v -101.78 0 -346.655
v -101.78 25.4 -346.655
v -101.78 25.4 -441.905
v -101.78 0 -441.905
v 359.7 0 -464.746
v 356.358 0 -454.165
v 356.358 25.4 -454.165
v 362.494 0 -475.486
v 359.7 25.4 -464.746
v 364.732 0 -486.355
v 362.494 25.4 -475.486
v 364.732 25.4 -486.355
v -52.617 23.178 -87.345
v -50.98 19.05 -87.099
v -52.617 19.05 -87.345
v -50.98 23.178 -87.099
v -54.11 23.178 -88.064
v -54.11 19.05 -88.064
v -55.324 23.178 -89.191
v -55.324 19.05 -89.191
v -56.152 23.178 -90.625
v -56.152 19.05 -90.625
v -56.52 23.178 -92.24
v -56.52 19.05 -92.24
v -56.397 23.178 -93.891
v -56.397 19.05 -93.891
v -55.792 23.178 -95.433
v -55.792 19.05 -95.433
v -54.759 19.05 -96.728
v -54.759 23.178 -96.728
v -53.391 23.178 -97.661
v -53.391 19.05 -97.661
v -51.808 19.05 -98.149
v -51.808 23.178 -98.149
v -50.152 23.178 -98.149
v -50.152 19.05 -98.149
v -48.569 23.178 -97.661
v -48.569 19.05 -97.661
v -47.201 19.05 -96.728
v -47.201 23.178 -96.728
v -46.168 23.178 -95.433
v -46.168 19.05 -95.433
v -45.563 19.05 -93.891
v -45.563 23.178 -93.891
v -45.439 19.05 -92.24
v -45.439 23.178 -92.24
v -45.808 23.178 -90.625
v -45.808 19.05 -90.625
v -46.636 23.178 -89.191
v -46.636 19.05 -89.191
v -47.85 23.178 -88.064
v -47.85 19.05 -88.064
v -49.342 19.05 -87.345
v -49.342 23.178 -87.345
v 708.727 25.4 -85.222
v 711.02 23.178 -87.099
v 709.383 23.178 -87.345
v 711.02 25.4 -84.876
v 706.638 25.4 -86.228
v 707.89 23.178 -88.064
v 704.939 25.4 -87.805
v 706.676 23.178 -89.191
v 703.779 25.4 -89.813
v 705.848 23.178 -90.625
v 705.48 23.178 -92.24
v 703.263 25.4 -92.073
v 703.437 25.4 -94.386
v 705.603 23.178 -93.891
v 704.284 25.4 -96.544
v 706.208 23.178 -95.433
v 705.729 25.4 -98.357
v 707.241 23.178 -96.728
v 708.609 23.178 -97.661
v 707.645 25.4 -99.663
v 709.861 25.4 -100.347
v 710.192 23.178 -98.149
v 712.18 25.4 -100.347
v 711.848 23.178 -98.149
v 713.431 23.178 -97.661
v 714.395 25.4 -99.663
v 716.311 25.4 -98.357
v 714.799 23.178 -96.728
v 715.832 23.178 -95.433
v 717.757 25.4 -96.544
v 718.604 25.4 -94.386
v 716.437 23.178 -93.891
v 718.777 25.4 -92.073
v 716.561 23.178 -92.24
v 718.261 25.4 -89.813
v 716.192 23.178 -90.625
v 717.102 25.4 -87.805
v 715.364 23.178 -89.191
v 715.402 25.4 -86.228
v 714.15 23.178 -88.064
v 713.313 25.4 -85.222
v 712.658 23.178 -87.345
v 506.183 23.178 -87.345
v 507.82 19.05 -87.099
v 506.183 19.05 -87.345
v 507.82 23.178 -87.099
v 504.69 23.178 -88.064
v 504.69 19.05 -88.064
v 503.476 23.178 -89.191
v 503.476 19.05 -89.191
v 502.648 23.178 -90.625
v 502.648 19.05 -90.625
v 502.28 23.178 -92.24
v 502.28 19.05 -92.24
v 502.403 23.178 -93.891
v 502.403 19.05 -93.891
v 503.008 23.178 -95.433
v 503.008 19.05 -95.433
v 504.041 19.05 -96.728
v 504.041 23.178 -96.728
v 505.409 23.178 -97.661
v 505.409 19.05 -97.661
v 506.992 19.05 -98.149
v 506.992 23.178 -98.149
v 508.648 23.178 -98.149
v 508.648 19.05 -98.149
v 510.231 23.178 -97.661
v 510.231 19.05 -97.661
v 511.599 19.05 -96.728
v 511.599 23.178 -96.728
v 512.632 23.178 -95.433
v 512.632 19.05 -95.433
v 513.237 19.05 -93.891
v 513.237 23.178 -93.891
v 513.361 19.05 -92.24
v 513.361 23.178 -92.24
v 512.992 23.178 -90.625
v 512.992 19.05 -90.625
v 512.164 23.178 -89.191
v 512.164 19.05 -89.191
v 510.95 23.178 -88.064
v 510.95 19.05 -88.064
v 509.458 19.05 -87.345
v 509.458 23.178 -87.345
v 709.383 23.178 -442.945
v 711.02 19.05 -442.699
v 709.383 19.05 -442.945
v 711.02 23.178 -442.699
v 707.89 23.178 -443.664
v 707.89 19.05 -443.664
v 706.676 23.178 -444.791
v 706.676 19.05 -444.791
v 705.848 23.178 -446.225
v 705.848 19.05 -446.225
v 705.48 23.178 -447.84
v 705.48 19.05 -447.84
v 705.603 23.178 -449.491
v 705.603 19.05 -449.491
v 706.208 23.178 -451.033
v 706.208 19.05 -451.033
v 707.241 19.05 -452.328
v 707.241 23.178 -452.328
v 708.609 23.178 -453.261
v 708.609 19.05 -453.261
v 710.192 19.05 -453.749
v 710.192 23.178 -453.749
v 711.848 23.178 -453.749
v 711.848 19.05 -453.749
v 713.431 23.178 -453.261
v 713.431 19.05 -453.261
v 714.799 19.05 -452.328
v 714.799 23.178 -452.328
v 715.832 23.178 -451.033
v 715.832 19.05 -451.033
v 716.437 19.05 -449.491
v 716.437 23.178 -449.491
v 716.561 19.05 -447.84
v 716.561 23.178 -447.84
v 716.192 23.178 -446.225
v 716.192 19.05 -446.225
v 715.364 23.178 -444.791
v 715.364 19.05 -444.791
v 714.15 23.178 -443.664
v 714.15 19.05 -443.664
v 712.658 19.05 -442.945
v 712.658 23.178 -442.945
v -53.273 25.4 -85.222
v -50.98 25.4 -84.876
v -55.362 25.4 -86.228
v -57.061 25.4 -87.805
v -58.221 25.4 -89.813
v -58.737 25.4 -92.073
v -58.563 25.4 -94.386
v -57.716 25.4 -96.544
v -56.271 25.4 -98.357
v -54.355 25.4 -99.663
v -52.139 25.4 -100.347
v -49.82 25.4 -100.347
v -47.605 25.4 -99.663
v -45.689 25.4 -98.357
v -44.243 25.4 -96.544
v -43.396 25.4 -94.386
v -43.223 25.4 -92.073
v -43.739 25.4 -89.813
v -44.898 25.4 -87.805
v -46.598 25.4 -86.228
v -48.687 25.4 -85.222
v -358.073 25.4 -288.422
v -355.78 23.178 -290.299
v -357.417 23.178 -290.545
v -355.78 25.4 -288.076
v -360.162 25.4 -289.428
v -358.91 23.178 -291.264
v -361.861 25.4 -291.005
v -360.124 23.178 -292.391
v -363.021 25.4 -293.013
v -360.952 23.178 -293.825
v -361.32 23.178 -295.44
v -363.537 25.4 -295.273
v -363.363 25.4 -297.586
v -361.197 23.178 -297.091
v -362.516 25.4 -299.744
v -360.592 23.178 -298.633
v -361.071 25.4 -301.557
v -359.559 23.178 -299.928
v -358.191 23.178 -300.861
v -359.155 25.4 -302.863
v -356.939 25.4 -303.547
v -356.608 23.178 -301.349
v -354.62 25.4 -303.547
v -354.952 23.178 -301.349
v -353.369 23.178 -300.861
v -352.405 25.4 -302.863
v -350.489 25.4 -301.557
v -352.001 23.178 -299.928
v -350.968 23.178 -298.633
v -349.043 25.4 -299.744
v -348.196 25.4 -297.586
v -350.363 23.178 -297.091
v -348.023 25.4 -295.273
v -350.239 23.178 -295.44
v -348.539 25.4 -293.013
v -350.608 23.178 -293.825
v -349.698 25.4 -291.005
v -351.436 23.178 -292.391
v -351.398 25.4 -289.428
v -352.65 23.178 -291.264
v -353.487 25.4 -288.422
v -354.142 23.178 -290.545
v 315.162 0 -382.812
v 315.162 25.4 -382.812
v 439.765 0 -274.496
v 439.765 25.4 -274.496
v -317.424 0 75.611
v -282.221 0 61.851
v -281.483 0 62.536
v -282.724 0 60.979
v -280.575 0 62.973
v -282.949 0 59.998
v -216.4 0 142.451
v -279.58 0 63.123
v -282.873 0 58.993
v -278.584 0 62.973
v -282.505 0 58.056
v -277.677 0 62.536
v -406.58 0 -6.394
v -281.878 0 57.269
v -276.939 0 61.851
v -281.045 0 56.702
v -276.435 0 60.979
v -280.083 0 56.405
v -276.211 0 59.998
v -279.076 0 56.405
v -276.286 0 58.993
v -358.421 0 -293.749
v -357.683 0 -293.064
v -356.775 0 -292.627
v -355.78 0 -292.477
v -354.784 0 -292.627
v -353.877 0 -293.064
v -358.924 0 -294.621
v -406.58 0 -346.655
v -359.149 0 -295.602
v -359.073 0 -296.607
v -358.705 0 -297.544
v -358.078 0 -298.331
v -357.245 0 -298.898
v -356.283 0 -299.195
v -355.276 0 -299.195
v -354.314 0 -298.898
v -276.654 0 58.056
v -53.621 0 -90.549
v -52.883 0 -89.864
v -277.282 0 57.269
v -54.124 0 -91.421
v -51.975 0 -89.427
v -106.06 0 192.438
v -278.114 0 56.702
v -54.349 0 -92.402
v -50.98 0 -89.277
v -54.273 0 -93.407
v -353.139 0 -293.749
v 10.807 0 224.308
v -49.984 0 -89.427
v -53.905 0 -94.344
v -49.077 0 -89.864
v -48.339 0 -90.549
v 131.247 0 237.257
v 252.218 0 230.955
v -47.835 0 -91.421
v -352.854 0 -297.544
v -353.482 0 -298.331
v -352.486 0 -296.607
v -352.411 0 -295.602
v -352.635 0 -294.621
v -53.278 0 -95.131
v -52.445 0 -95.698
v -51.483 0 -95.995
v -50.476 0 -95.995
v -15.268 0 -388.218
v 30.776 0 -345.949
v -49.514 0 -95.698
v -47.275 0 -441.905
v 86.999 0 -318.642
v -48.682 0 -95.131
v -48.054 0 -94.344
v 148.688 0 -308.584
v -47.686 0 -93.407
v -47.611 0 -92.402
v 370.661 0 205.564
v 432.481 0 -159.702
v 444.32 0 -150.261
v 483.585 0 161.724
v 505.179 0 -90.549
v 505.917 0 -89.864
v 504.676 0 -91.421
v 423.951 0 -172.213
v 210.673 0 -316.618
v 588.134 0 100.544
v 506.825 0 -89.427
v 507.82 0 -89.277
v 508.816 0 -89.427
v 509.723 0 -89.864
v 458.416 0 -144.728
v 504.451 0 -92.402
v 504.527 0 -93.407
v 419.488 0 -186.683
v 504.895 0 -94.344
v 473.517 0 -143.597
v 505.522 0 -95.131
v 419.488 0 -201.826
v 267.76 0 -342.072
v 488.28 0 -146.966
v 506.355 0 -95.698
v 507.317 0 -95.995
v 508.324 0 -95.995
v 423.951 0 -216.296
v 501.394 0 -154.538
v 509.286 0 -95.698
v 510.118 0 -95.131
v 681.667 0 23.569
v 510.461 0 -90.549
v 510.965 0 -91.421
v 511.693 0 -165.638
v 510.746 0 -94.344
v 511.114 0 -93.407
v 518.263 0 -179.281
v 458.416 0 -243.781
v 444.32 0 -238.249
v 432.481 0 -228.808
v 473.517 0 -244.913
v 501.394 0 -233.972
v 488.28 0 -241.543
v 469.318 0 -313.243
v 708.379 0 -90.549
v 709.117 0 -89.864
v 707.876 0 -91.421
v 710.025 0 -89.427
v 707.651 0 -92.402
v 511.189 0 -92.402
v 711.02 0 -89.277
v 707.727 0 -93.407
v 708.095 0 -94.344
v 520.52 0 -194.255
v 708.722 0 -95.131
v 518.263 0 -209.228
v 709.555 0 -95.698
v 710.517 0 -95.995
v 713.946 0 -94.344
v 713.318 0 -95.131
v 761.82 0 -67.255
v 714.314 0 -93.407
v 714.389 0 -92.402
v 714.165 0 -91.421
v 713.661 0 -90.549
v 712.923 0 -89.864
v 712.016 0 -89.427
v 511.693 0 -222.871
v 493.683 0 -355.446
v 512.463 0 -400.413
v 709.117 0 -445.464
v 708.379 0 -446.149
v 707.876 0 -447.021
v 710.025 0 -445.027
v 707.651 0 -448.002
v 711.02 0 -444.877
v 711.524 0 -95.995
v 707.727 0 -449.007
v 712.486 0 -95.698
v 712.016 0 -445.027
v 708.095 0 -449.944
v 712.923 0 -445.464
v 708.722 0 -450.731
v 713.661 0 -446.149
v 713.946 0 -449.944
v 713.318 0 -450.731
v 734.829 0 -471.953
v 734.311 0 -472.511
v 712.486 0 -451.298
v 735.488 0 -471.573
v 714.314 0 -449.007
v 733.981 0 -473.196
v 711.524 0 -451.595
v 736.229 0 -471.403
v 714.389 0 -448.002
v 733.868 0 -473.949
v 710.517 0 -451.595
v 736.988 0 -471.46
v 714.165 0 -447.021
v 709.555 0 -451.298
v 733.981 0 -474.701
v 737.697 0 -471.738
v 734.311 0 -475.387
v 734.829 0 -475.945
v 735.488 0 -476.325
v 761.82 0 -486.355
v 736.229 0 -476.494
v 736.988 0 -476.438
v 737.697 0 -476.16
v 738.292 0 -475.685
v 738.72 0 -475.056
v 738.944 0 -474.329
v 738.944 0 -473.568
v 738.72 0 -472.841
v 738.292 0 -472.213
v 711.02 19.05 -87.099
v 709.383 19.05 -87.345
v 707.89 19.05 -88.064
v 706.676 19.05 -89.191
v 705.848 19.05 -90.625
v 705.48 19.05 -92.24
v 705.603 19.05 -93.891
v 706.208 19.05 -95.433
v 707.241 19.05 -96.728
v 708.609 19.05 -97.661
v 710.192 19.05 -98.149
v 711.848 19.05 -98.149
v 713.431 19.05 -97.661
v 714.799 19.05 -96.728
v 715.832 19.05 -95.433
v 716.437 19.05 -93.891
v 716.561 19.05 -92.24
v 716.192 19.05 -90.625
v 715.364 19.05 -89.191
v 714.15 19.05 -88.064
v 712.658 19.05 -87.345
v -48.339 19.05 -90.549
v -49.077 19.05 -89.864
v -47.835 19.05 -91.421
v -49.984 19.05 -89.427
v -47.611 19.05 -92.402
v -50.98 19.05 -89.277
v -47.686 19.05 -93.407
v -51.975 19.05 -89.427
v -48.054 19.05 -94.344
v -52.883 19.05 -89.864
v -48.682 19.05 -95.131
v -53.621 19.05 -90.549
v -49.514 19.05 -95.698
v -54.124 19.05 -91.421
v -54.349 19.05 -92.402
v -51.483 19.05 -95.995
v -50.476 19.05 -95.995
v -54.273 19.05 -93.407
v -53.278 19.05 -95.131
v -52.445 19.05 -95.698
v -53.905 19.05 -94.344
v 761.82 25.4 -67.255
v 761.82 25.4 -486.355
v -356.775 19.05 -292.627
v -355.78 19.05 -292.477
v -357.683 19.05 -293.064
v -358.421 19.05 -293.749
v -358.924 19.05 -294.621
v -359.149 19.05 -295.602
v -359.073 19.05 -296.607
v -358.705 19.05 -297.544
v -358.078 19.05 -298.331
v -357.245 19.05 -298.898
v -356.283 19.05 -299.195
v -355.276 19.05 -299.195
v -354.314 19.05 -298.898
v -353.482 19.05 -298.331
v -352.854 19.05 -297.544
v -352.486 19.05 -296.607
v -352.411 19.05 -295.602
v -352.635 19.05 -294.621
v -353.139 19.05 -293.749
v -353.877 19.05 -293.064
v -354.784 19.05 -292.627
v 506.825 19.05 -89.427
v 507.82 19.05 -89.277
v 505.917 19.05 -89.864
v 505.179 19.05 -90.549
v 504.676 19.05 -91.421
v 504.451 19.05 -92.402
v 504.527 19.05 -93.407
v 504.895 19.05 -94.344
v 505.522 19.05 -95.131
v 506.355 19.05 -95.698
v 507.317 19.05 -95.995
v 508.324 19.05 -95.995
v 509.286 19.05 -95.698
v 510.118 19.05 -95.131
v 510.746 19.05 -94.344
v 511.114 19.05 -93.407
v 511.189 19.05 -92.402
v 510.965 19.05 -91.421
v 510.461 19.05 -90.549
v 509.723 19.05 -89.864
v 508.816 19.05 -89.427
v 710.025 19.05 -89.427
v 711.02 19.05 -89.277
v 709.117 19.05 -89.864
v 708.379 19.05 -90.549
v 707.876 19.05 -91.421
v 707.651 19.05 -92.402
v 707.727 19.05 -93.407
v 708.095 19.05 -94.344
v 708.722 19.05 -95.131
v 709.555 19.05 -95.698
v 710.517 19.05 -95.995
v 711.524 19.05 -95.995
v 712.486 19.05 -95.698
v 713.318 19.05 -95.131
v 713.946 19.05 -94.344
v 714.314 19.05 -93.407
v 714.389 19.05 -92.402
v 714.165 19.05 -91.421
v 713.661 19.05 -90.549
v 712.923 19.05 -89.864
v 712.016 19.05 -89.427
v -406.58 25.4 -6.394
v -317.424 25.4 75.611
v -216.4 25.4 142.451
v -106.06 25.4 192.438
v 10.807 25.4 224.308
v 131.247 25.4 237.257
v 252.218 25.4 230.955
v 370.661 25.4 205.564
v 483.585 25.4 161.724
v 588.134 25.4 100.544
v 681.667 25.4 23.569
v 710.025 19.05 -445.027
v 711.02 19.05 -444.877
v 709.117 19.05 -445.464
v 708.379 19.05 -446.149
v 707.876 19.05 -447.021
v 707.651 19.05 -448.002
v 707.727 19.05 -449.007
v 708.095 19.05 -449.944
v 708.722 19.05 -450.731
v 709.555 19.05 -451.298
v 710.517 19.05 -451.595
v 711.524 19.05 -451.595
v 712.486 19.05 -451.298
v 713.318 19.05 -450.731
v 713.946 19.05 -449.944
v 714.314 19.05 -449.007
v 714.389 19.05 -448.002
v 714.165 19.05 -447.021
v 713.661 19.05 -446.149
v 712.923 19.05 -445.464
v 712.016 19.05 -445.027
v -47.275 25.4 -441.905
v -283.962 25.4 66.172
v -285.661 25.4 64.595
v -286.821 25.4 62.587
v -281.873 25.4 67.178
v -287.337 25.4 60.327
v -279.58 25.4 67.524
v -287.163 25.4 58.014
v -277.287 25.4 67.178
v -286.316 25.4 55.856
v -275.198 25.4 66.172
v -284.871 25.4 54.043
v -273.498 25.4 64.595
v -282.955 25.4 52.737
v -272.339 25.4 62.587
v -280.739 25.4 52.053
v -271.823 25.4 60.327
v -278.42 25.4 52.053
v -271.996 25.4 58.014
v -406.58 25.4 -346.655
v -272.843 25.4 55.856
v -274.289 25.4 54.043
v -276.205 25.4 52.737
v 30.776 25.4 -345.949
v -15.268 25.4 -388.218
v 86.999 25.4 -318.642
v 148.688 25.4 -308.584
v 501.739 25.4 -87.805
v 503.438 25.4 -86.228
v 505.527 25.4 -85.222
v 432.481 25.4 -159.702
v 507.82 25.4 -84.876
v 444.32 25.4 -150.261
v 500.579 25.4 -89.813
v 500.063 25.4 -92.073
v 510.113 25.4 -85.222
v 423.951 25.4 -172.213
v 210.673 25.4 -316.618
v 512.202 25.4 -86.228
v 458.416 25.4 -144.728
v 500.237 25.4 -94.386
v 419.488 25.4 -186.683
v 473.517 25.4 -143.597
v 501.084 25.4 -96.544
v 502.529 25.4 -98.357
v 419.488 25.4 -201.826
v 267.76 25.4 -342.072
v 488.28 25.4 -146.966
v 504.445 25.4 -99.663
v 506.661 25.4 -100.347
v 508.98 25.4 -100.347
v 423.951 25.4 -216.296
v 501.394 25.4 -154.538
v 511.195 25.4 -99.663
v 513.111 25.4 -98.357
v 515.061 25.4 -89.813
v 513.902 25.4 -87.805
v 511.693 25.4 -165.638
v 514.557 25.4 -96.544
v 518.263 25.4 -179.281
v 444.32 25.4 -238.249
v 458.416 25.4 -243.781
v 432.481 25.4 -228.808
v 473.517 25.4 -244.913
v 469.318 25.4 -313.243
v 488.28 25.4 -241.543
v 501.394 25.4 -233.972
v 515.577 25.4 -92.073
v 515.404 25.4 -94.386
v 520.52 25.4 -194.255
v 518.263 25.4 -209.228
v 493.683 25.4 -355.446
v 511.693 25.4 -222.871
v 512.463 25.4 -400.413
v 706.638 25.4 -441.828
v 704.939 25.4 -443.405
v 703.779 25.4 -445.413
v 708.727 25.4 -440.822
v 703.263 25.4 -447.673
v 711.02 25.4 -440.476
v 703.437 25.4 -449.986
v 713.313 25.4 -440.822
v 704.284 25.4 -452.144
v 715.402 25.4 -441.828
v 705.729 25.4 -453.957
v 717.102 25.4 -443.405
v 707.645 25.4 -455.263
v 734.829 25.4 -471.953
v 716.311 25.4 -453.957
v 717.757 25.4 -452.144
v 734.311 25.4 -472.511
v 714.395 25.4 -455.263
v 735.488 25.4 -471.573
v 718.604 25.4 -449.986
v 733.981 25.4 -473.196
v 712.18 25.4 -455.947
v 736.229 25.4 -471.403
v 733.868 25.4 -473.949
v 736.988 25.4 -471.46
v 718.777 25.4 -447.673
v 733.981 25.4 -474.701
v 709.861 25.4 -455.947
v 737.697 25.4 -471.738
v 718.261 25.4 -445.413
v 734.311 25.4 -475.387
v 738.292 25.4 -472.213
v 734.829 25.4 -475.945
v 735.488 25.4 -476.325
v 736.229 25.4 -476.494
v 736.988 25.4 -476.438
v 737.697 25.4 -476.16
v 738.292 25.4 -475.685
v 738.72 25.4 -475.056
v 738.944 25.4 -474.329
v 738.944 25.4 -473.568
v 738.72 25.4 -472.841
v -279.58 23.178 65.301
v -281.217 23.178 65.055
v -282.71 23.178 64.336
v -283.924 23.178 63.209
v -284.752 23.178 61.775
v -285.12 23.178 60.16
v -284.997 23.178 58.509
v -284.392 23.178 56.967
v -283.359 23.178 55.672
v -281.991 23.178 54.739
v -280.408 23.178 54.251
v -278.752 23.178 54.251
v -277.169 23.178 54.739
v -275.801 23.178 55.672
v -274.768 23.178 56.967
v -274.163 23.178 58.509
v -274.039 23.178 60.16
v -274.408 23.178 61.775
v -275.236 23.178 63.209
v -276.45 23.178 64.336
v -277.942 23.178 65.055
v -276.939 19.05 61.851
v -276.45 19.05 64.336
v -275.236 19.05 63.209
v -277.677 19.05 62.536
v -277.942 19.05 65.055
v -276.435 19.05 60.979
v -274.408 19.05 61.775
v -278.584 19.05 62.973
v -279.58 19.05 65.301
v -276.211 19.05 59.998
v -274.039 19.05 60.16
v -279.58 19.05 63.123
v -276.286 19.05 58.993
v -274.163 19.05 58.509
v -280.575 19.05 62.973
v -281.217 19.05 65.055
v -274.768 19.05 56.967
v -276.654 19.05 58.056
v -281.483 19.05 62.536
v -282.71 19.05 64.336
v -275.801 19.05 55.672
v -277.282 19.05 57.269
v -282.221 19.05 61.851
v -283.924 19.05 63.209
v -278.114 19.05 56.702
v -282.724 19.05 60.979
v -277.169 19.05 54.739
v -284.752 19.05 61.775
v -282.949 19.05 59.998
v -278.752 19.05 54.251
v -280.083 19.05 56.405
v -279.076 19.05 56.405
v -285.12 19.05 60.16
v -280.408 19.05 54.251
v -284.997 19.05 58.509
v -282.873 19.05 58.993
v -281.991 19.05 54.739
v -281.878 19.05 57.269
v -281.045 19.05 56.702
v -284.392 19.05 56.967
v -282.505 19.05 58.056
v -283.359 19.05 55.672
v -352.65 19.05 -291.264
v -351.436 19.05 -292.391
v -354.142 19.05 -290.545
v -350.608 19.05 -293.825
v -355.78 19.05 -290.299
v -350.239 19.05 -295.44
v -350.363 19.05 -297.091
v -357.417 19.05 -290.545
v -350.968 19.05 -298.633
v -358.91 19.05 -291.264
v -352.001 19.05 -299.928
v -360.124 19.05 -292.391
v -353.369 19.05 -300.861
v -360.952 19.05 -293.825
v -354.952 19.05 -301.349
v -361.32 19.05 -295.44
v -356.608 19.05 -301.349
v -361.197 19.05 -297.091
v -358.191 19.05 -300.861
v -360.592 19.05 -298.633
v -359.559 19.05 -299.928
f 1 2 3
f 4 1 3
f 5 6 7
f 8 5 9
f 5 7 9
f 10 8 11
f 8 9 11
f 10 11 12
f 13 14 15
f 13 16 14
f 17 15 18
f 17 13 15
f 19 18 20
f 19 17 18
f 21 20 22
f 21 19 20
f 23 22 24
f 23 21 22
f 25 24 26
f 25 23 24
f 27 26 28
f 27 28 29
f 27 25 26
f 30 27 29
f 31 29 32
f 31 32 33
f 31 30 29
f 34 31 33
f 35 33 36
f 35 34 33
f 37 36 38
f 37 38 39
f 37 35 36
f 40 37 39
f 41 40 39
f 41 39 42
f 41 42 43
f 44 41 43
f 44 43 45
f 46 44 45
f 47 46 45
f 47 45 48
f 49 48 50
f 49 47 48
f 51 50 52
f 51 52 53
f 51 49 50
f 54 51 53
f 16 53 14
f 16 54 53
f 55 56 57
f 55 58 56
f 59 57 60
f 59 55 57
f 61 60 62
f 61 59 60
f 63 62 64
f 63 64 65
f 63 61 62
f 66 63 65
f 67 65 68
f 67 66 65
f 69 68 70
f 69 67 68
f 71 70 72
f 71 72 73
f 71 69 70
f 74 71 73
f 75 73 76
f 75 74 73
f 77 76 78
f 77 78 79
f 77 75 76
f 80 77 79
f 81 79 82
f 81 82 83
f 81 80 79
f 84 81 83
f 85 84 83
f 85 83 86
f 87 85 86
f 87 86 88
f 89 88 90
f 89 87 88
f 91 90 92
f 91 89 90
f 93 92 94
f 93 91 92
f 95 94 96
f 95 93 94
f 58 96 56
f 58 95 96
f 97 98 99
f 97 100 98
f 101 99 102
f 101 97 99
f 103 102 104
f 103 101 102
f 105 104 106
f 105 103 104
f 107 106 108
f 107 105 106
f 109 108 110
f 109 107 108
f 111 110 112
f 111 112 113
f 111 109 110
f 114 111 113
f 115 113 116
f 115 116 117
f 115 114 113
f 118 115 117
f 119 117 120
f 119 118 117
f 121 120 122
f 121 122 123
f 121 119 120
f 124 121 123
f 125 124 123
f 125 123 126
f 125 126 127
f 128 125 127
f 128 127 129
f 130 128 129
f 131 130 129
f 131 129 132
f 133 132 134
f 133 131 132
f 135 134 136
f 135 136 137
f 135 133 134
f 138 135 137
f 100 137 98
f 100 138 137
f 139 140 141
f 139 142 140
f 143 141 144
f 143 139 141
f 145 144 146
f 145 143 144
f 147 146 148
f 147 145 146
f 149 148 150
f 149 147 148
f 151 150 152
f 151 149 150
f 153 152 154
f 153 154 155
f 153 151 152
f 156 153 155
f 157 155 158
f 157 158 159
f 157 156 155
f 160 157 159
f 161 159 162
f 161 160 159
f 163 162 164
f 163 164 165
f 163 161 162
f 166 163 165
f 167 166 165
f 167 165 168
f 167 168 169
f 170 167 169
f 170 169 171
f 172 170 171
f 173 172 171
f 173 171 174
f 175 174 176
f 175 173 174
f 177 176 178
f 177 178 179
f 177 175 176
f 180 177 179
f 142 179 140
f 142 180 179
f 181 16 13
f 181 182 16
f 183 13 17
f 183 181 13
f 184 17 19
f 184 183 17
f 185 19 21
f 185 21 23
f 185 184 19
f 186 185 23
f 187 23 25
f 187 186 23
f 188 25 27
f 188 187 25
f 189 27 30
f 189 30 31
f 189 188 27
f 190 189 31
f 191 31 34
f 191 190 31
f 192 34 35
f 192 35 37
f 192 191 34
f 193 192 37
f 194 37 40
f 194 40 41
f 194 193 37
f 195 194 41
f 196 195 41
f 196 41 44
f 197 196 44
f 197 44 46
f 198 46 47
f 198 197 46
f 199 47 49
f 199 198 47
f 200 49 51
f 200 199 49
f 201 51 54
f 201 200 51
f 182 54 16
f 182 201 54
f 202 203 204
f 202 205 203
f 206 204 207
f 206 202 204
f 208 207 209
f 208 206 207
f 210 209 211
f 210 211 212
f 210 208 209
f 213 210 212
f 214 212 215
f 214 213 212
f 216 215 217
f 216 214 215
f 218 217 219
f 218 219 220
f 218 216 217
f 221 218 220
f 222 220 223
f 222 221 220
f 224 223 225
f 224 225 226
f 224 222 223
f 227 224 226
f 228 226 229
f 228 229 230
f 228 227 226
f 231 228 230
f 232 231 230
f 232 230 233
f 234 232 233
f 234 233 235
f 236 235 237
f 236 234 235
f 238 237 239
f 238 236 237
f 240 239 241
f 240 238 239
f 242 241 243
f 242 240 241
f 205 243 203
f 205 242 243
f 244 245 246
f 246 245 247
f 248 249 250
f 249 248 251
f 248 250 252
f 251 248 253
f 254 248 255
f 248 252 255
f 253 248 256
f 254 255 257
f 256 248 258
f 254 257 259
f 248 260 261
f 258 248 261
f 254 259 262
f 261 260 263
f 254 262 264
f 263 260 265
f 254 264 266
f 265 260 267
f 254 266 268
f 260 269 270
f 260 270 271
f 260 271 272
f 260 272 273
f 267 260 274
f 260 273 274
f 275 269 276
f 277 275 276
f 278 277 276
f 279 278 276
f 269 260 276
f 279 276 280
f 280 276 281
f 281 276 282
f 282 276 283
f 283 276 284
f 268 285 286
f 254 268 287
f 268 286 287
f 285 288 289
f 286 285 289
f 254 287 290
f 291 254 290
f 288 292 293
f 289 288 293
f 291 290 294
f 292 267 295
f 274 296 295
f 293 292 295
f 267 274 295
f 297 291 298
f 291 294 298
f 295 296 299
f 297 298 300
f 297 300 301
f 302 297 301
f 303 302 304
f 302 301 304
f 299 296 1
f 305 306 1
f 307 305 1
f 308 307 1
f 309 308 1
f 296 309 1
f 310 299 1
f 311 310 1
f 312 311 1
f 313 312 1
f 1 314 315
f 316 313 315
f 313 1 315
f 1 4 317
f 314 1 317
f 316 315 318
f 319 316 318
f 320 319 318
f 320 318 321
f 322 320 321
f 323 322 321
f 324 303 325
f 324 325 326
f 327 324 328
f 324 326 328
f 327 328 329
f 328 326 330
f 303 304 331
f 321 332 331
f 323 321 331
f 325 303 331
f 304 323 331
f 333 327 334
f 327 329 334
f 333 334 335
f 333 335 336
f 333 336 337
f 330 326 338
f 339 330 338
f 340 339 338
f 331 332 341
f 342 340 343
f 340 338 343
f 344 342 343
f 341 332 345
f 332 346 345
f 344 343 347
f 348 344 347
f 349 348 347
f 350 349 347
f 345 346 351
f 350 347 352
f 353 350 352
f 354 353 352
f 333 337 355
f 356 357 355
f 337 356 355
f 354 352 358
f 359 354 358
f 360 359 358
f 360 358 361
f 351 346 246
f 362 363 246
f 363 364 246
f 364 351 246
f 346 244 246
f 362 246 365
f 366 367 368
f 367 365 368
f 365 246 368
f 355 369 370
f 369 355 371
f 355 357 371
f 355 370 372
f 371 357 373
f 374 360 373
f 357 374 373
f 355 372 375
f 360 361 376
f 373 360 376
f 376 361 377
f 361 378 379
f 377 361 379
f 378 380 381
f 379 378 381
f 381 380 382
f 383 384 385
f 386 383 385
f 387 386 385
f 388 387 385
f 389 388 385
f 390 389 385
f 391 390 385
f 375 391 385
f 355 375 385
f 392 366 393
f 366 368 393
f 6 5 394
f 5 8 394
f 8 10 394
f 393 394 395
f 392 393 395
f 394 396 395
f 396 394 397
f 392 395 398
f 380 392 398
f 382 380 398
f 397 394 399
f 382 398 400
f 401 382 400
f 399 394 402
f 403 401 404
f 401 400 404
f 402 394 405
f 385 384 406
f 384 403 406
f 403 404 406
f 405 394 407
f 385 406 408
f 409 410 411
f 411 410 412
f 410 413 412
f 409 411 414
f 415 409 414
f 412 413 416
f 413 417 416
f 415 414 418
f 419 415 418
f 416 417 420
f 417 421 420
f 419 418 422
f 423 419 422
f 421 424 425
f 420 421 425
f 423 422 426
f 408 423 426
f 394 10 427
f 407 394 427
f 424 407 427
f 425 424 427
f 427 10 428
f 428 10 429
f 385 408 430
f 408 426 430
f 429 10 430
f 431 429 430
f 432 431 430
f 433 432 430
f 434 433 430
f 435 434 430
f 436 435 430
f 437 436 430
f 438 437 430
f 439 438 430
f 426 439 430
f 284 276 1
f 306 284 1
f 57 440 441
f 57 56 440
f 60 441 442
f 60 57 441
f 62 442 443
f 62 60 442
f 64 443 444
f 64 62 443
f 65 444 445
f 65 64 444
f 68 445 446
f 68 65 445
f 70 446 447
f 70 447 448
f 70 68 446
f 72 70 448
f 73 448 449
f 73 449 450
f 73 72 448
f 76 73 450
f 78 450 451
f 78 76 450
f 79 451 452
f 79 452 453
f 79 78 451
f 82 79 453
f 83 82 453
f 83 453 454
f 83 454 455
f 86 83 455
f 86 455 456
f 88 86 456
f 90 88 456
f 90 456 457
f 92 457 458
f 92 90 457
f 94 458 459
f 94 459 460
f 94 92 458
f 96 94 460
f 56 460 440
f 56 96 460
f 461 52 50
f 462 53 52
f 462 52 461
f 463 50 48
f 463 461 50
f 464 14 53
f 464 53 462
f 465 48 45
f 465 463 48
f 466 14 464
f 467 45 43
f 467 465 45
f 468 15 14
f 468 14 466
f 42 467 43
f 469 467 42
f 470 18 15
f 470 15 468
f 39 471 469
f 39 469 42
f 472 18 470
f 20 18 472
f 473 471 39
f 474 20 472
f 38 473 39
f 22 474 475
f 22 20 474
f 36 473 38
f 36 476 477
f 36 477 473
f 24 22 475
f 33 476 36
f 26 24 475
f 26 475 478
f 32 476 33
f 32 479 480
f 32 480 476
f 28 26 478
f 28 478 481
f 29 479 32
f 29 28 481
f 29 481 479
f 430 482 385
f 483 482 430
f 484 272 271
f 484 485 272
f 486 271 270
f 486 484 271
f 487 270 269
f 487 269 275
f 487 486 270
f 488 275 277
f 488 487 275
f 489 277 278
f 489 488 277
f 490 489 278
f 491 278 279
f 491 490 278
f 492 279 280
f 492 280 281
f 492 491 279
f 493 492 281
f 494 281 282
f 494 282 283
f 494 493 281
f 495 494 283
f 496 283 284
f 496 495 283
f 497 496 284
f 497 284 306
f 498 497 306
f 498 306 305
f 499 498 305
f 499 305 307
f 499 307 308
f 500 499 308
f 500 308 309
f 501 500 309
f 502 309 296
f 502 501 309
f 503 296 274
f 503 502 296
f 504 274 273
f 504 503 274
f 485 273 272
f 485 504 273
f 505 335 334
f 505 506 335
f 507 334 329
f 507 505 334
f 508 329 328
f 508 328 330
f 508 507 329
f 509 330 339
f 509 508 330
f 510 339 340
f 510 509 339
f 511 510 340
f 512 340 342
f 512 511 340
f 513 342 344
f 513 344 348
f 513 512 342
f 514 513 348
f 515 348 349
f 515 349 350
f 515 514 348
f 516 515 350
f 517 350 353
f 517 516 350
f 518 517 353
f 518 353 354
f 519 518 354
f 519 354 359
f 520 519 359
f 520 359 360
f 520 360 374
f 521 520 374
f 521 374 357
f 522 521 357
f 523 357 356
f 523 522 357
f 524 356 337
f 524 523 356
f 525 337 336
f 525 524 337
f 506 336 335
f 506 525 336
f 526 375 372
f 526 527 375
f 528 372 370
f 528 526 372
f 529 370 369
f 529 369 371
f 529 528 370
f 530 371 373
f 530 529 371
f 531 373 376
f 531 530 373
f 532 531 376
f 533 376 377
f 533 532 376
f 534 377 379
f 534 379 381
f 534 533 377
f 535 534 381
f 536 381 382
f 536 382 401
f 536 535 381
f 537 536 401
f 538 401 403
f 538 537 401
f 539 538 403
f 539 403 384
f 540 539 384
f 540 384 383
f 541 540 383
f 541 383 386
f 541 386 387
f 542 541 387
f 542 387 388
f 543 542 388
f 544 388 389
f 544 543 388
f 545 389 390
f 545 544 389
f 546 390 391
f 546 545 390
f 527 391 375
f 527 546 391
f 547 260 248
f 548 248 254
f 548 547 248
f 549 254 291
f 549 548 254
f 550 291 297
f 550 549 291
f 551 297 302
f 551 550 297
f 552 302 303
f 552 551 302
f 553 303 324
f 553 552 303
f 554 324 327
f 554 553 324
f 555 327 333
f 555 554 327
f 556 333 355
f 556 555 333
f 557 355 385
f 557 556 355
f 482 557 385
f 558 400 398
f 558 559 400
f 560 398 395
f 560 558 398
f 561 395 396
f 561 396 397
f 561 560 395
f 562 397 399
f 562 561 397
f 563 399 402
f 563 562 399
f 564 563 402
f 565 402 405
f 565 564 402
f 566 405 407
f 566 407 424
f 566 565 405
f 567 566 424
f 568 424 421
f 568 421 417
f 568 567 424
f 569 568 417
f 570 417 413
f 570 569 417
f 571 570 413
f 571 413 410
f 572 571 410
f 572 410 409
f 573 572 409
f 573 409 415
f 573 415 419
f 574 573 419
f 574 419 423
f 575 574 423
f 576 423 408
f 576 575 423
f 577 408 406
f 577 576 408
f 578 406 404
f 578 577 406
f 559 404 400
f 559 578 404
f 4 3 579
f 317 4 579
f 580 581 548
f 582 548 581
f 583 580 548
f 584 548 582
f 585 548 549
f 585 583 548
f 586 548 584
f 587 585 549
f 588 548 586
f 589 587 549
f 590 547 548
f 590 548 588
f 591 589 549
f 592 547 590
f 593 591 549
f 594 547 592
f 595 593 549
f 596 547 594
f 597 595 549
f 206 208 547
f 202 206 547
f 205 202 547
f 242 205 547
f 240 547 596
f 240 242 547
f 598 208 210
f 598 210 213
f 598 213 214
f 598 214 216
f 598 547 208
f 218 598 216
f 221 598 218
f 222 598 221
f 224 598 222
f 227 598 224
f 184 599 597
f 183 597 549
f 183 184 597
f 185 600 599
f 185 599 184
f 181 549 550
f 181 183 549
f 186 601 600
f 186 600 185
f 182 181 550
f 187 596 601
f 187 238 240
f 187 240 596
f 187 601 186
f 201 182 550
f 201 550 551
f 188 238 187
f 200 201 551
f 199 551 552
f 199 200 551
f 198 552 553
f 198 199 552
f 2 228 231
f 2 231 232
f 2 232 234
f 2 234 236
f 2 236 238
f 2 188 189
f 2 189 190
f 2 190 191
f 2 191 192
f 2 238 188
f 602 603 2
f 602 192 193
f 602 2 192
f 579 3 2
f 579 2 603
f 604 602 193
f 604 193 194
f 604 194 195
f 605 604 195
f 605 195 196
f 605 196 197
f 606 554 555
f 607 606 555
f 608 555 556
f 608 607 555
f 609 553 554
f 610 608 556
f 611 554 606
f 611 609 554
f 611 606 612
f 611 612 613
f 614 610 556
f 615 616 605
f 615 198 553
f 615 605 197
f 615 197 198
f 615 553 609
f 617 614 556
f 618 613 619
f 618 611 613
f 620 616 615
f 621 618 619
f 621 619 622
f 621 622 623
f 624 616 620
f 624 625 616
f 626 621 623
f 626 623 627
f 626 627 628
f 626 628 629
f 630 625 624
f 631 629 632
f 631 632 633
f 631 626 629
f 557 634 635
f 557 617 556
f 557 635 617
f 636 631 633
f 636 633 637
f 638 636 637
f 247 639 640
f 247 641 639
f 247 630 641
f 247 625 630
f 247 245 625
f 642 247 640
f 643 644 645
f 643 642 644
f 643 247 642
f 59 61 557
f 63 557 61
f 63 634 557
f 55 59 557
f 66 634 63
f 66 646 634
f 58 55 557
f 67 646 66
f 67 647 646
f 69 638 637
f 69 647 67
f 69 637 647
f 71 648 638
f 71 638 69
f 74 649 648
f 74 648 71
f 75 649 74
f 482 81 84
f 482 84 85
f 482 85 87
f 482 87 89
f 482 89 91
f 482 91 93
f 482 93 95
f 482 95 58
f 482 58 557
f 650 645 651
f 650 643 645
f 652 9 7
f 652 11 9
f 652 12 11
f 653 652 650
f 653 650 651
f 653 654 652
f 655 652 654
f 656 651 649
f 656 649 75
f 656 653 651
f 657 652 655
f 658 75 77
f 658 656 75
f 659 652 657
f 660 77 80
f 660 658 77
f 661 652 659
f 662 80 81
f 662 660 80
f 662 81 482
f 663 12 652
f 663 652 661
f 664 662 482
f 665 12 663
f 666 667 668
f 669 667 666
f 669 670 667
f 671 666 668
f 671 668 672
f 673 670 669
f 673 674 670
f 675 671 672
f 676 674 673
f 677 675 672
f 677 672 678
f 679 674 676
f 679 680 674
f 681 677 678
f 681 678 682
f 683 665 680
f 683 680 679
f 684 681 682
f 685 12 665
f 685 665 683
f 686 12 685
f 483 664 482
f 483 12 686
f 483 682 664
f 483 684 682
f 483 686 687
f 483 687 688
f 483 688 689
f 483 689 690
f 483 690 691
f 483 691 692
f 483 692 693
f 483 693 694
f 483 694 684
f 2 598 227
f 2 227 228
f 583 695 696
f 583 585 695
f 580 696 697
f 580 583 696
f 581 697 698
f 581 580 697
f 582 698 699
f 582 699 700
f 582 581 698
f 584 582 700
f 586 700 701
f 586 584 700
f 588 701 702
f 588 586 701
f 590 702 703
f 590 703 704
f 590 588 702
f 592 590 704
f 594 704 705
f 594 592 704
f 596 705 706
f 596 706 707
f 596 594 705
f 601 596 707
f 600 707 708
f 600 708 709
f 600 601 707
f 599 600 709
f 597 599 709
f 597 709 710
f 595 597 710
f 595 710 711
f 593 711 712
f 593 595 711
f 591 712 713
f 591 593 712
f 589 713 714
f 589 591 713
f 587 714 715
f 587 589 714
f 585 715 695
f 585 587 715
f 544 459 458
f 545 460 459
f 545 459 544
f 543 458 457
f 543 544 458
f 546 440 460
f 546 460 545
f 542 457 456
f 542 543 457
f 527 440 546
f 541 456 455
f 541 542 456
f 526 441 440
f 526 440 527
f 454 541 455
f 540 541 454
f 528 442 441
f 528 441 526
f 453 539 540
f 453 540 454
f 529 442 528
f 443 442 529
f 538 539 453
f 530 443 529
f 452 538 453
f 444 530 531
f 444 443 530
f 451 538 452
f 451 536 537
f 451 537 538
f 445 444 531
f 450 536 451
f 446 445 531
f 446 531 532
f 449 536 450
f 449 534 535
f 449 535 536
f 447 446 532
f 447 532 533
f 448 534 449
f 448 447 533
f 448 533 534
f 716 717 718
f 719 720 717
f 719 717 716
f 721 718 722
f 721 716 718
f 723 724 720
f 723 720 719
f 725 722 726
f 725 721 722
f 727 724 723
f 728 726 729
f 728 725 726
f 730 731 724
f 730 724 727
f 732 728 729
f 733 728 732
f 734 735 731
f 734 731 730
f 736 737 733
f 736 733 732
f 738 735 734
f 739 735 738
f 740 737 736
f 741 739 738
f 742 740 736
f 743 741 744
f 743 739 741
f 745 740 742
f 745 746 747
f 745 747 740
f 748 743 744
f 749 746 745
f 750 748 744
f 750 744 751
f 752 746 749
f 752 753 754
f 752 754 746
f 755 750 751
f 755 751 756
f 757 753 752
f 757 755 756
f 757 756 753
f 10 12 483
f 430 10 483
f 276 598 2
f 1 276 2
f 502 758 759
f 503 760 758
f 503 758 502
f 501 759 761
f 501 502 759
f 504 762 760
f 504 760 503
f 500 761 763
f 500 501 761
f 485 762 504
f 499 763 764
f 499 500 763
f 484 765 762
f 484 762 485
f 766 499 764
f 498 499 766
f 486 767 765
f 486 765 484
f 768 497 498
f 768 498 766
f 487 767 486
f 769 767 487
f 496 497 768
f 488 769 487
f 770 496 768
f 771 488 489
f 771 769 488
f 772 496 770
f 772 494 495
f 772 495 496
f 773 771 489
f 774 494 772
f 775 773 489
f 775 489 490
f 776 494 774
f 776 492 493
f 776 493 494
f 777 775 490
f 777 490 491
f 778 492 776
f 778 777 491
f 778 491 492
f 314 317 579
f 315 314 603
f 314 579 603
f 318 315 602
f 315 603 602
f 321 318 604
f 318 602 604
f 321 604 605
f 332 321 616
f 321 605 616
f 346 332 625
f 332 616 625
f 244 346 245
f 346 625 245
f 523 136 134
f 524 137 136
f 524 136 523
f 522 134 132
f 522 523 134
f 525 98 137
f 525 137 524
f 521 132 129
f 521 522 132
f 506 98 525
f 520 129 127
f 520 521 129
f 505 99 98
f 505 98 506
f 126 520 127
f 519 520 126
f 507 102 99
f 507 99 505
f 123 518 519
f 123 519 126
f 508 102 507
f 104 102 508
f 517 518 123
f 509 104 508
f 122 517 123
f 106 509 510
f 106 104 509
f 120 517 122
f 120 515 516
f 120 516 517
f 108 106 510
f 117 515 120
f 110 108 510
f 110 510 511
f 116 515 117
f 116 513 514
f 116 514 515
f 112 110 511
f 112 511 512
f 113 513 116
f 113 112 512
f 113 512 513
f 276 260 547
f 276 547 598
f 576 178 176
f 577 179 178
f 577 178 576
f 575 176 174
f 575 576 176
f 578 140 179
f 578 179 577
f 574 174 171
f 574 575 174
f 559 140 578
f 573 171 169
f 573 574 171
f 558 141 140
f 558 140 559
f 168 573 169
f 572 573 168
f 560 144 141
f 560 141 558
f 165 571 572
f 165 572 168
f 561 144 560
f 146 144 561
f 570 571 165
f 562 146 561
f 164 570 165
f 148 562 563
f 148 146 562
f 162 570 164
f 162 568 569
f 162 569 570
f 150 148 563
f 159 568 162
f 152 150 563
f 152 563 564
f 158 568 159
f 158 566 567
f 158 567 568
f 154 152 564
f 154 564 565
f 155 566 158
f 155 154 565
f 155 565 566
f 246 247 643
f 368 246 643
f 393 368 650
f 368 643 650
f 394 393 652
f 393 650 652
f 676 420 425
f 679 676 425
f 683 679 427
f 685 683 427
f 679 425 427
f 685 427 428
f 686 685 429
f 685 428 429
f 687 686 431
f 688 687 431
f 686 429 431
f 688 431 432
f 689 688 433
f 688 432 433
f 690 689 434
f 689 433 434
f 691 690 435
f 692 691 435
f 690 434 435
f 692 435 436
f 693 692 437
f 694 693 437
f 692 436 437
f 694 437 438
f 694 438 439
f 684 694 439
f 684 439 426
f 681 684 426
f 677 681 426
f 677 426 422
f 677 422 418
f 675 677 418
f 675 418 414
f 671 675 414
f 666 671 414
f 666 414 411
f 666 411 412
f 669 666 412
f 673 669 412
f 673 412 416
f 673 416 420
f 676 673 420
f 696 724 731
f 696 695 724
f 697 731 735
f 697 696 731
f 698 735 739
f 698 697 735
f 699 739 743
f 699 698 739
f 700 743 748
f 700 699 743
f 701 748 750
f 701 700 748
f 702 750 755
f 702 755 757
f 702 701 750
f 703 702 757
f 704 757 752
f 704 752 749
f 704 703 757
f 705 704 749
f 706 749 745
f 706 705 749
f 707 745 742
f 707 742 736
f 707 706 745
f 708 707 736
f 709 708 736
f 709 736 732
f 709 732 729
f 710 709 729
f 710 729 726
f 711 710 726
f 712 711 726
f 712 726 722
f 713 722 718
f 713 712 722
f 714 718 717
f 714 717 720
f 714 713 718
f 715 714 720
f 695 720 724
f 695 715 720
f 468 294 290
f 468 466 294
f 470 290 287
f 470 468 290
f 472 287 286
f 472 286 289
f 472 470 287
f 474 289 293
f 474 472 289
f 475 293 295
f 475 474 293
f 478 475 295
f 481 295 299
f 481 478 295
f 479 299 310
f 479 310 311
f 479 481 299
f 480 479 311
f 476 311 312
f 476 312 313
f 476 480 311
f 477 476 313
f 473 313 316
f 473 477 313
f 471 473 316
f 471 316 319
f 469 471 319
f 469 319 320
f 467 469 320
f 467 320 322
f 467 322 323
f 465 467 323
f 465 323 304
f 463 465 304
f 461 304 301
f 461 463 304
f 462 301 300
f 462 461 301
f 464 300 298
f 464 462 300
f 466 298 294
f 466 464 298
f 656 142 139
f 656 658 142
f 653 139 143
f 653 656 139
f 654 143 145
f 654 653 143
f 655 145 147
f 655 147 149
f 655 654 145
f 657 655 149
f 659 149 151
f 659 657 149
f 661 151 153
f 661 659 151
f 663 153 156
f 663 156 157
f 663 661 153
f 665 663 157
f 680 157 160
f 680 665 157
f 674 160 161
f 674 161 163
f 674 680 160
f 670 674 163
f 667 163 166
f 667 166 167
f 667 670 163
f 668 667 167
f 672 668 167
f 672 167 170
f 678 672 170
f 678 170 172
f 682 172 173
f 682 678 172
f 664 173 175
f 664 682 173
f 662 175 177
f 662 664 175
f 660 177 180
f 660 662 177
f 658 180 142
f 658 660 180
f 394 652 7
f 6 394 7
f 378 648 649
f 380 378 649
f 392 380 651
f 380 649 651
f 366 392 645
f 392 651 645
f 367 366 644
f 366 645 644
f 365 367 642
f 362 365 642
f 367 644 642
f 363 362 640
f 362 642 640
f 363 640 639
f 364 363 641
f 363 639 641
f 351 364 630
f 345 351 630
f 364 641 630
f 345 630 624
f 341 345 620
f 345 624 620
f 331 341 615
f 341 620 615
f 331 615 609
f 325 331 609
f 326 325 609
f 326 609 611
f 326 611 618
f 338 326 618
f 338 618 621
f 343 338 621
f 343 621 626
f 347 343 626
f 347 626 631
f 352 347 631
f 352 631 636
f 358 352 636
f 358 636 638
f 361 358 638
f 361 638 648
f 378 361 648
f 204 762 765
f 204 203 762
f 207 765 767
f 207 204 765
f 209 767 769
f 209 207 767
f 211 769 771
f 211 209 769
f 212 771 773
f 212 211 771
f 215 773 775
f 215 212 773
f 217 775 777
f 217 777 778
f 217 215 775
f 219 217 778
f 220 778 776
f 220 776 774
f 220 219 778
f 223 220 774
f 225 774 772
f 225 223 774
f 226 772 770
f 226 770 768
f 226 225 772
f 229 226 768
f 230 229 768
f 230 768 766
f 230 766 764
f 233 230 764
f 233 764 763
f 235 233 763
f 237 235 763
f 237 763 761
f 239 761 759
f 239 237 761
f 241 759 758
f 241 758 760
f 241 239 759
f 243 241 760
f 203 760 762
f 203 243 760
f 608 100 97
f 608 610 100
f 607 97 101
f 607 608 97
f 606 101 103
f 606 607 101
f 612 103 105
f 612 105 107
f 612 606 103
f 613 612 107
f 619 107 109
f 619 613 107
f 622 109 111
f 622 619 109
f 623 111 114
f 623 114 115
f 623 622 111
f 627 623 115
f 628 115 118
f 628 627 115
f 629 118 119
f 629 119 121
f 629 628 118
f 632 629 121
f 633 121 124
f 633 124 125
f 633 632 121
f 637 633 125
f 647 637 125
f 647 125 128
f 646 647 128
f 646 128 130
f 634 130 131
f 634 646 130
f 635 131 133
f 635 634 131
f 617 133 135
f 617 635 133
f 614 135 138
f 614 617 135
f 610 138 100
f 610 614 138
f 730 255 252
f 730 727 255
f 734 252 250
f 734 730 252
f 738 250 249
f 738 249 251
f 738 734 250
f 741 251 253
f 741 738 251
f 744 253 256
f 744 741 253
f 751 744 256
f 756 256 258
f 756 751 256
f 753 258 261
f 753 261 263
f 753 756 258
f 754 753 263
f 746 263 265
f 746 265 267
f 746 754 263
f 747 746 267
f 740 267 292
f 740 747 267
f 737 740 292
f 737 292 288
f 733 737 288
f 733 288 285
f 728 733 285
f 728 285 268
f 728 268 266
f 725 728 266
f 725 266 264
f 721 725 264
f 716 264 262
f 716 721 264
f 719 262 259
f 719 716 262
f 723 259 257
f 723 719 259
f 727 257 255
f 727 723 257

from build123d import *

# Parameters (mm, degrees)
SKETCH2_W                                     = 2006.6
SKETCH2_H                                     = 762
BOSS_EXTRUDE1_DEPTH                           = 25.4
CUT_EXTRUDE18_DEPTH                           = 26.4
F_1_4_20_TAPPED_HOLE1_D                       = 5.1054
SKETCH4_R                                     = 215.9
CUT_EXTRUDE1_DEPTH                            = 26.4
SKETCH26_W                                    = 381
SKETCH26_H                                    = 82.55
CUT_EXTRUDE2_DEPTH                            = 26.4
SKETCH109_R                                   = 50.8
CUT_EXTRUDE15_DEPTH                           = 26.4
SKETCH48_W                                    = 304.8
SKETCH48_H                                    = 95.25
CUT_EXTRUDE9_DEPTH                            = 26.4
CUT_EXTRUDE12_DEPTH                           = 26.4
CUT_EXTRUDE13_DEPTH                           = 26.4
CUT_EXTRUDE17_DEPTH                           = 26.4
CBORE_FOR_1_4_SOCKET_HEAD_CAP_SCREW1_AT_COUNT = 2
CBORE_FOR_1_4_SOCKET_HEAD_CAP_SCREW1_AT_PITCH = 558.8
CBORE_FOR_1_4_SOCKET_HEAD_CAP_SCREW1_2_COUNT  = 2
CBORE_FOR_1_4_SOCKET_HEAD_CAP_SCREW1_2_PITCH  = 366.324009587
CBORE_FOR_1_4_SOCKET_HEAD_CAP_SCREW1_3_COUNT  = 2
CBORE_FOR_1_4_SOCKET_HEAD_CAP_SCREW1_3_PITCH  = 274.74300719
CBORE_FOR_1_4_SOCKET_HEAD_CAP_SCREW1_4_COUNT  = 2
CBORE_FOR_1_4_SOCKET_HEAD_CAP_SCREW1_4_PITCH  = 840.889624148
CBORE_FOR_1_4_SOCKET_HEAD_CAP_SCREW1_5_COUNT  = 2
CBORE_FOR_1_4_SOCKET_HEAD_CAP_SCREW1_5_PITCH  = 762


with BuildPart() as part:
    # Sketch2 → Boss-Extrude1 (new body)
    with BuildSketch(Plane(origin=(0, 0, 0), x_dir=(1, 0, 0), z_dir=(0, 1, 0))):
        with Locations((596.720248579, 143.454782609)):
            Rectangle(SKETCH2_W, SKETCH2_H)
    extrude(amount=BOSS_EXTRUDE1_DEPTH)

    # Sketch120 → Cut-Extrude18 (cut, through all)
    with BuildSketch(Plane(origin=(0, 25.4, 0), x_dir=(1, 0, 0), z_dir=(0, 1, 0))):
        with BuildLine():
            Line((364.731895319, 486.354782609), (761.820248579, 486.354782609))
            Line((761.820248579, 486.354782609), (761.820248579, 524.454782609))
            Line((761.820248579, 524.454782609), (368.120248579, 524.454782609))
            ThreePointArc((368.120248579, 524.454782609), (367.271491927, 505.329596742), (364.731895319, 486.354782609))
        make_face()
    extrude(amount=-CUT_EXTRUDE18_DEPTH, mode=Mode.SUBTRACT)

    # 1/4-20 Tapped Hole1 (through all)
    with Locations(Plane(origin=(0, 25.4, 0), x_dir=(1, 0, 0), z_dir=(0, 1, 0))):
        with Locations((736.420248579, 473.948827926)):
            Hole(F_1_4_20_TAPPED_HOLE1_D / 2)

    # Sketch4 → Cut-Extrude1 (cut, through all)
    with BuildSketch(Plane(origin=(0, 25.4, 0), x_dir=(1, 0, 0), z_dir=(0, 1, 0))):
        with Locations((152.220248579, 524.454782609)):
            Circle(SKETCH4_R)
    extrude(amount=-CUT_EXTRUDE1_DEPTH, mode=Mode.SUBTRACT)

    # Sketch26 → Cut-Extrude2 (cut, through all)
    with BuildSketch(Plane(origin=(0, 25.4, 0), x_dir=(1, 0, 0), z_dir=(0, 1, 0))):
        with Locations((-216.079751421, 483.179782609)):
            Rectangle(SKETCH26_W, SKETCH26_H)
    extrude(amount=-CUT_EXTRUDE2_DEPTH, mode=Mode.SUBTRACT)

    # Sketch109 → Cut-Extrude15 (cut, through all)
    with BuildSketch(Plane(origin=(0, 25.4, 0), x_dir=(1, 0, 0), z_dir=(0, 1, 0))):
        with Locations((469.720248579, 194.254782609)):
            Circle(SKETCH109_R)
    extrude(amount=-CUT_EXTRUDE15_DEPTH, mode=Mode.SUBTRACT)

    # Sketch48 → Cut-Extrude9 (cut, through all)
    with BuildSketch(Plane(origin=(0, 25.4, 0), x_dir=(1, 0, 0), z_dir=(0, 1, 0))):
        with Locations((-254.179751421, 394.279782609)):
            Rectangle(SKETCH48_W, SKETCH48_H)
    extrude(amount=-CUT_EXTRUDE9_DEPTH, mode=Mode.SUBTRACT)

    # Sketch56 → Cut-Extrude12 (cut, through all)
    with BuildSketch(Plane(origin=(0, 25.4, 0), x_dir=(1, 0, 0), z_dir=(0, 1, 0))):
        with BuildLine():
            Line((512.462825882, 400.413315761), (152.220248579, 524.454782609))
            Line((152.220248579, 524.454782609), (439.764598644, 274.496292563))
            ThreePointArc((439.764598644, 274.496292563), (482.175927421, 333.954782609), (512.462825882, 400.413315761))
        make_face()
    extrude(amount=-CUT_EXTRUDE12_DEPTH, mode=Mode.SUBTRACT)

    # Sketch105 → Cut-Extrude13 (cut, through all)
    with BuildSketch(Plane(origin=(0, 25.4, 0), x_dir=(1, 0, 0), z_dir=(0, 1, 0))):
        with BuildLine():
            Line((152.220248579, -237.545217391), (-406.579751421, -237.545217391))
            Line((-406.579751421, -237.545217391), (-406.579751421, 6.394400028))
            ThreePointArc((-406.579751421, 6.394400028), (-152.64200595, -173.902579895), (152.220248579, -237.545217391))
        make_face()
    extrude(amount=-CUT_EXTRUDE13_DEPTH, mode=Mode.SUBTRACT)

    # Sketch111 → Cut-Extrude17 (cut, through all)
    with BuildSketch(Plane(origin=(0, 25.4, 0), x_dir=(1, 0, 0), z_dir=(0, 1, 0))):
        with BuildLine():
            Line((761.820248579, 67.254782609), (761.820248579, 524.454782609))
            Line((761.820248579, 524.454782609), (1600.020248579, 524.454782609))
            Line((1600.020248579, 524.454782609), (1600.020248579, -237.545217391))
            Line((1600.020248579, -237.545217391), (152.220248579, -237.545217391))
            ThreePointArc((152.220248579, -237.545217391), (492.99700835, -157.098736933), (761.820248579, 67.254782609))
        make_face()
    extrude(amount=-CUT_EXTRUDE17_DEPTH, mode=Mode.SUBTRACT)

    # Sketch123 → CBORE for 1/4 Socket Head Cap Screw1 (revolve, cut)
    with BuildSketch(Plane(origin=(-50.979751421, 25.4, -92.654782609), x_dir=(0, 0, 1), z_dir=(1, 0, 0))):
        Polygon((0, 0), (0, 25.4), (3.3782, 25.4), (3.3782, 6.35), (5.55625, 6.35), (5.55625, 2.2225), (7.77875, 0), align=None)
    cbore_for_1_4_socket_head_cap_screw1 = revolve(axis=Axis((-50.979751421, 31.75, -92.654782609), (0, -1, 0)), mode=Mode.SUBTRACT)

    # CBORE for 1/4 Socket Head Cap Screw1 at: CBORE for 1/4 Socket Head Cap Screw1 ×2
    with Locations(*[(i * CBORE_FOR_1_4_SOCKET_HEAD_CAP_SCREW1_AT_PITCH, 0, 0) for i in range(1, CBORE_FOR_1_4_SOCKET_HEAD_CAP_SCREW1_AT_COUNT)]):
        add(cbore_for_1_4_socket_head_cap_screw1, mode=Mode.SUBTRACT)

    # CBORE for 1_4 Socket Head Cap Screw1 2: CBORE for 1/4 Socket Head Cap Screw1 ×2
    with Locations(*[Vector(-0.832050294, 0, -0.554700196) * (i * CBORE_FOR_1_4_SOCKET_HEAD_CAP_SCREW1_2_PITCH) for i in range(1, CBORE_FOR_1_4_SOCKET_HEAD_CAP_SCREW1_2_COUNT)]):
        add(cbore_for_1_4_socket_head_cap_screw1, mode=Mode.SUBTRACT)

    # CBORE for 1_4 Socket Head Cap Screw1 3: CBORE for 1/4 Socket Head Cap Screw1 ×2
    with Locations(*[Vector(-0.832050294, 0, 0.554700196) * (i * CBORE_FOR_1_4_SOCKET_HEAD_CAP_SCREW1_3_PITCH) for i in range(1, CBORE_FOR_1_4_SOCKET_HEAD_CAP_SCREW1_3_COUNT)]):
        add(cbore_for_1_4_socket_head_cap_screw1, mode=Mode.SUBTRACT)

    # CBORE for 1_4 Socket Head Cap Screw1 4: CBORE for 1/4 Socket Head Cap Screw1 ×2
    with Locations(*[Vector(0.90618314, 0, -0.422885465) * (i * CBORE_FOR_1_4_SOCKET_HEAD_CAP_SCREW1_4_PITCH) for i in range(1, CBORE_FOR_1_4_SOCKET_HEAD_CAP_SCREW1_4_COUNT)]):
        add(cbore_for_1_4_socket_head_cap_screw1, mode=Mode.SUBTRACT)

    # CBORE for 1_4 Socket Head Cap Screw1 5: CBORE for 1/4 Socket Head Cap Screw1 ×2
    with Locations(*[(i * CBORE_FOR_1_4_SOCKET_HEAD_CAP_SCREW1_5_PITCH, 0, 0) for i in range(1, CBORE_FOR_1_4_SOCKET_HEAD_CAP_SCREW1_5_COUNT)]):
        add(cbore_for_1_4_socket_head_cap_screw1, mode=Mode.SUBTRACT)


solid = part.part
